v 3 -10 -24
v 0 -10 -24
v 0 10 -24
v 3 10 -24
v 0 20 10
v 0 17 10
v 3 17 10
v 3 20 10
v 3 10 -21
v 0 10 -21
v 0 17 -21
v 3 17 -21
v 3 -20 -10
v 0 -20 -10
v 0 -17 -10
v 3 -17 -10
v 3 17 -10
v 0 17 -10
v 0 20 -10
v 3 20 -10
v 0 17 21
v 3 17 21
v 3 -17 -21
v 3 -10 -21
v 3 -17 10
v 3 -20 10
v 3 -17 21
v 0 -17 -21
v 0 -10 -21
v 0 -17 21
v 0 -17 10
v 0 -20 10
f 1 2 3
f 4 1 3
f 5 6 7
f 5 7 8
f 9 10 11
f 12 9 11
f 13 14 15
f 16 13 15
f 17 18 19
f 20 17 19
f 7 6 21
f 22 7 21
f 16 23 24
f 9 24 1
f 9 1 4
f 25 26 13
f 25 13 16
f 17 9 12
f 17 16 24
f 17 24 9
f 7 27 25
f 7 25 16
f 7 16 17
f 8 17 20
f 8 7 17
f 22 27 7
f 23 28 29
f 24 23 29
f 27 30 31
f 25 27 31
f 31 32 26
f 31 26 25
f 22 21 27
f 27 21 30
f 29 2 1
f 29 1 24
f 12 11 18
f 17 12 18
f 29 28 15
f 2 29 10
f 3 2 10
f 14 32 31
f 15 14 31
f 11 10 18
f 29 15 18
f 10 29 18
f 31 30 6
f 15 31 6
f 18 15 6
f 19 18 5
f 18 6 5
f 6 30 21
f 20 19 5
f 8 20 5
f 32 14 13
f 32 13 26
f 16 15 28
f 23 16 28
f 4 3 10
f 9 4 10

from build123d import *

# Parameters (mm, degrees)
F0_W     = 3
F0_H     = 20
F0_W_2   = 20
F0_H_2   = 3
F1_DEPTH = 3


with BuildPart() as f1:
    # F0 (on Right) → F1 (new body)
    with BuildSketch(Plane.YZ):
        Polygon((17, 10), (17, 21), (-17, 21), (-17, 10), (-17, -10), (-17, -21), (-10, -21), (10, -21), (17, -21), (17, -10), align=None)
        with Locations((18.5, 0)):
            Rectangle(F0_W, F0_H)
        with Locations((-18.5, 0)):
            Rectangle(F0_W, F0_H)
        with Locations((0, -22.5)):
            Rectangle(F0_W_2, F0_H_2)
    extrude(amount=F1_DEPTH)


solid = f1.part
